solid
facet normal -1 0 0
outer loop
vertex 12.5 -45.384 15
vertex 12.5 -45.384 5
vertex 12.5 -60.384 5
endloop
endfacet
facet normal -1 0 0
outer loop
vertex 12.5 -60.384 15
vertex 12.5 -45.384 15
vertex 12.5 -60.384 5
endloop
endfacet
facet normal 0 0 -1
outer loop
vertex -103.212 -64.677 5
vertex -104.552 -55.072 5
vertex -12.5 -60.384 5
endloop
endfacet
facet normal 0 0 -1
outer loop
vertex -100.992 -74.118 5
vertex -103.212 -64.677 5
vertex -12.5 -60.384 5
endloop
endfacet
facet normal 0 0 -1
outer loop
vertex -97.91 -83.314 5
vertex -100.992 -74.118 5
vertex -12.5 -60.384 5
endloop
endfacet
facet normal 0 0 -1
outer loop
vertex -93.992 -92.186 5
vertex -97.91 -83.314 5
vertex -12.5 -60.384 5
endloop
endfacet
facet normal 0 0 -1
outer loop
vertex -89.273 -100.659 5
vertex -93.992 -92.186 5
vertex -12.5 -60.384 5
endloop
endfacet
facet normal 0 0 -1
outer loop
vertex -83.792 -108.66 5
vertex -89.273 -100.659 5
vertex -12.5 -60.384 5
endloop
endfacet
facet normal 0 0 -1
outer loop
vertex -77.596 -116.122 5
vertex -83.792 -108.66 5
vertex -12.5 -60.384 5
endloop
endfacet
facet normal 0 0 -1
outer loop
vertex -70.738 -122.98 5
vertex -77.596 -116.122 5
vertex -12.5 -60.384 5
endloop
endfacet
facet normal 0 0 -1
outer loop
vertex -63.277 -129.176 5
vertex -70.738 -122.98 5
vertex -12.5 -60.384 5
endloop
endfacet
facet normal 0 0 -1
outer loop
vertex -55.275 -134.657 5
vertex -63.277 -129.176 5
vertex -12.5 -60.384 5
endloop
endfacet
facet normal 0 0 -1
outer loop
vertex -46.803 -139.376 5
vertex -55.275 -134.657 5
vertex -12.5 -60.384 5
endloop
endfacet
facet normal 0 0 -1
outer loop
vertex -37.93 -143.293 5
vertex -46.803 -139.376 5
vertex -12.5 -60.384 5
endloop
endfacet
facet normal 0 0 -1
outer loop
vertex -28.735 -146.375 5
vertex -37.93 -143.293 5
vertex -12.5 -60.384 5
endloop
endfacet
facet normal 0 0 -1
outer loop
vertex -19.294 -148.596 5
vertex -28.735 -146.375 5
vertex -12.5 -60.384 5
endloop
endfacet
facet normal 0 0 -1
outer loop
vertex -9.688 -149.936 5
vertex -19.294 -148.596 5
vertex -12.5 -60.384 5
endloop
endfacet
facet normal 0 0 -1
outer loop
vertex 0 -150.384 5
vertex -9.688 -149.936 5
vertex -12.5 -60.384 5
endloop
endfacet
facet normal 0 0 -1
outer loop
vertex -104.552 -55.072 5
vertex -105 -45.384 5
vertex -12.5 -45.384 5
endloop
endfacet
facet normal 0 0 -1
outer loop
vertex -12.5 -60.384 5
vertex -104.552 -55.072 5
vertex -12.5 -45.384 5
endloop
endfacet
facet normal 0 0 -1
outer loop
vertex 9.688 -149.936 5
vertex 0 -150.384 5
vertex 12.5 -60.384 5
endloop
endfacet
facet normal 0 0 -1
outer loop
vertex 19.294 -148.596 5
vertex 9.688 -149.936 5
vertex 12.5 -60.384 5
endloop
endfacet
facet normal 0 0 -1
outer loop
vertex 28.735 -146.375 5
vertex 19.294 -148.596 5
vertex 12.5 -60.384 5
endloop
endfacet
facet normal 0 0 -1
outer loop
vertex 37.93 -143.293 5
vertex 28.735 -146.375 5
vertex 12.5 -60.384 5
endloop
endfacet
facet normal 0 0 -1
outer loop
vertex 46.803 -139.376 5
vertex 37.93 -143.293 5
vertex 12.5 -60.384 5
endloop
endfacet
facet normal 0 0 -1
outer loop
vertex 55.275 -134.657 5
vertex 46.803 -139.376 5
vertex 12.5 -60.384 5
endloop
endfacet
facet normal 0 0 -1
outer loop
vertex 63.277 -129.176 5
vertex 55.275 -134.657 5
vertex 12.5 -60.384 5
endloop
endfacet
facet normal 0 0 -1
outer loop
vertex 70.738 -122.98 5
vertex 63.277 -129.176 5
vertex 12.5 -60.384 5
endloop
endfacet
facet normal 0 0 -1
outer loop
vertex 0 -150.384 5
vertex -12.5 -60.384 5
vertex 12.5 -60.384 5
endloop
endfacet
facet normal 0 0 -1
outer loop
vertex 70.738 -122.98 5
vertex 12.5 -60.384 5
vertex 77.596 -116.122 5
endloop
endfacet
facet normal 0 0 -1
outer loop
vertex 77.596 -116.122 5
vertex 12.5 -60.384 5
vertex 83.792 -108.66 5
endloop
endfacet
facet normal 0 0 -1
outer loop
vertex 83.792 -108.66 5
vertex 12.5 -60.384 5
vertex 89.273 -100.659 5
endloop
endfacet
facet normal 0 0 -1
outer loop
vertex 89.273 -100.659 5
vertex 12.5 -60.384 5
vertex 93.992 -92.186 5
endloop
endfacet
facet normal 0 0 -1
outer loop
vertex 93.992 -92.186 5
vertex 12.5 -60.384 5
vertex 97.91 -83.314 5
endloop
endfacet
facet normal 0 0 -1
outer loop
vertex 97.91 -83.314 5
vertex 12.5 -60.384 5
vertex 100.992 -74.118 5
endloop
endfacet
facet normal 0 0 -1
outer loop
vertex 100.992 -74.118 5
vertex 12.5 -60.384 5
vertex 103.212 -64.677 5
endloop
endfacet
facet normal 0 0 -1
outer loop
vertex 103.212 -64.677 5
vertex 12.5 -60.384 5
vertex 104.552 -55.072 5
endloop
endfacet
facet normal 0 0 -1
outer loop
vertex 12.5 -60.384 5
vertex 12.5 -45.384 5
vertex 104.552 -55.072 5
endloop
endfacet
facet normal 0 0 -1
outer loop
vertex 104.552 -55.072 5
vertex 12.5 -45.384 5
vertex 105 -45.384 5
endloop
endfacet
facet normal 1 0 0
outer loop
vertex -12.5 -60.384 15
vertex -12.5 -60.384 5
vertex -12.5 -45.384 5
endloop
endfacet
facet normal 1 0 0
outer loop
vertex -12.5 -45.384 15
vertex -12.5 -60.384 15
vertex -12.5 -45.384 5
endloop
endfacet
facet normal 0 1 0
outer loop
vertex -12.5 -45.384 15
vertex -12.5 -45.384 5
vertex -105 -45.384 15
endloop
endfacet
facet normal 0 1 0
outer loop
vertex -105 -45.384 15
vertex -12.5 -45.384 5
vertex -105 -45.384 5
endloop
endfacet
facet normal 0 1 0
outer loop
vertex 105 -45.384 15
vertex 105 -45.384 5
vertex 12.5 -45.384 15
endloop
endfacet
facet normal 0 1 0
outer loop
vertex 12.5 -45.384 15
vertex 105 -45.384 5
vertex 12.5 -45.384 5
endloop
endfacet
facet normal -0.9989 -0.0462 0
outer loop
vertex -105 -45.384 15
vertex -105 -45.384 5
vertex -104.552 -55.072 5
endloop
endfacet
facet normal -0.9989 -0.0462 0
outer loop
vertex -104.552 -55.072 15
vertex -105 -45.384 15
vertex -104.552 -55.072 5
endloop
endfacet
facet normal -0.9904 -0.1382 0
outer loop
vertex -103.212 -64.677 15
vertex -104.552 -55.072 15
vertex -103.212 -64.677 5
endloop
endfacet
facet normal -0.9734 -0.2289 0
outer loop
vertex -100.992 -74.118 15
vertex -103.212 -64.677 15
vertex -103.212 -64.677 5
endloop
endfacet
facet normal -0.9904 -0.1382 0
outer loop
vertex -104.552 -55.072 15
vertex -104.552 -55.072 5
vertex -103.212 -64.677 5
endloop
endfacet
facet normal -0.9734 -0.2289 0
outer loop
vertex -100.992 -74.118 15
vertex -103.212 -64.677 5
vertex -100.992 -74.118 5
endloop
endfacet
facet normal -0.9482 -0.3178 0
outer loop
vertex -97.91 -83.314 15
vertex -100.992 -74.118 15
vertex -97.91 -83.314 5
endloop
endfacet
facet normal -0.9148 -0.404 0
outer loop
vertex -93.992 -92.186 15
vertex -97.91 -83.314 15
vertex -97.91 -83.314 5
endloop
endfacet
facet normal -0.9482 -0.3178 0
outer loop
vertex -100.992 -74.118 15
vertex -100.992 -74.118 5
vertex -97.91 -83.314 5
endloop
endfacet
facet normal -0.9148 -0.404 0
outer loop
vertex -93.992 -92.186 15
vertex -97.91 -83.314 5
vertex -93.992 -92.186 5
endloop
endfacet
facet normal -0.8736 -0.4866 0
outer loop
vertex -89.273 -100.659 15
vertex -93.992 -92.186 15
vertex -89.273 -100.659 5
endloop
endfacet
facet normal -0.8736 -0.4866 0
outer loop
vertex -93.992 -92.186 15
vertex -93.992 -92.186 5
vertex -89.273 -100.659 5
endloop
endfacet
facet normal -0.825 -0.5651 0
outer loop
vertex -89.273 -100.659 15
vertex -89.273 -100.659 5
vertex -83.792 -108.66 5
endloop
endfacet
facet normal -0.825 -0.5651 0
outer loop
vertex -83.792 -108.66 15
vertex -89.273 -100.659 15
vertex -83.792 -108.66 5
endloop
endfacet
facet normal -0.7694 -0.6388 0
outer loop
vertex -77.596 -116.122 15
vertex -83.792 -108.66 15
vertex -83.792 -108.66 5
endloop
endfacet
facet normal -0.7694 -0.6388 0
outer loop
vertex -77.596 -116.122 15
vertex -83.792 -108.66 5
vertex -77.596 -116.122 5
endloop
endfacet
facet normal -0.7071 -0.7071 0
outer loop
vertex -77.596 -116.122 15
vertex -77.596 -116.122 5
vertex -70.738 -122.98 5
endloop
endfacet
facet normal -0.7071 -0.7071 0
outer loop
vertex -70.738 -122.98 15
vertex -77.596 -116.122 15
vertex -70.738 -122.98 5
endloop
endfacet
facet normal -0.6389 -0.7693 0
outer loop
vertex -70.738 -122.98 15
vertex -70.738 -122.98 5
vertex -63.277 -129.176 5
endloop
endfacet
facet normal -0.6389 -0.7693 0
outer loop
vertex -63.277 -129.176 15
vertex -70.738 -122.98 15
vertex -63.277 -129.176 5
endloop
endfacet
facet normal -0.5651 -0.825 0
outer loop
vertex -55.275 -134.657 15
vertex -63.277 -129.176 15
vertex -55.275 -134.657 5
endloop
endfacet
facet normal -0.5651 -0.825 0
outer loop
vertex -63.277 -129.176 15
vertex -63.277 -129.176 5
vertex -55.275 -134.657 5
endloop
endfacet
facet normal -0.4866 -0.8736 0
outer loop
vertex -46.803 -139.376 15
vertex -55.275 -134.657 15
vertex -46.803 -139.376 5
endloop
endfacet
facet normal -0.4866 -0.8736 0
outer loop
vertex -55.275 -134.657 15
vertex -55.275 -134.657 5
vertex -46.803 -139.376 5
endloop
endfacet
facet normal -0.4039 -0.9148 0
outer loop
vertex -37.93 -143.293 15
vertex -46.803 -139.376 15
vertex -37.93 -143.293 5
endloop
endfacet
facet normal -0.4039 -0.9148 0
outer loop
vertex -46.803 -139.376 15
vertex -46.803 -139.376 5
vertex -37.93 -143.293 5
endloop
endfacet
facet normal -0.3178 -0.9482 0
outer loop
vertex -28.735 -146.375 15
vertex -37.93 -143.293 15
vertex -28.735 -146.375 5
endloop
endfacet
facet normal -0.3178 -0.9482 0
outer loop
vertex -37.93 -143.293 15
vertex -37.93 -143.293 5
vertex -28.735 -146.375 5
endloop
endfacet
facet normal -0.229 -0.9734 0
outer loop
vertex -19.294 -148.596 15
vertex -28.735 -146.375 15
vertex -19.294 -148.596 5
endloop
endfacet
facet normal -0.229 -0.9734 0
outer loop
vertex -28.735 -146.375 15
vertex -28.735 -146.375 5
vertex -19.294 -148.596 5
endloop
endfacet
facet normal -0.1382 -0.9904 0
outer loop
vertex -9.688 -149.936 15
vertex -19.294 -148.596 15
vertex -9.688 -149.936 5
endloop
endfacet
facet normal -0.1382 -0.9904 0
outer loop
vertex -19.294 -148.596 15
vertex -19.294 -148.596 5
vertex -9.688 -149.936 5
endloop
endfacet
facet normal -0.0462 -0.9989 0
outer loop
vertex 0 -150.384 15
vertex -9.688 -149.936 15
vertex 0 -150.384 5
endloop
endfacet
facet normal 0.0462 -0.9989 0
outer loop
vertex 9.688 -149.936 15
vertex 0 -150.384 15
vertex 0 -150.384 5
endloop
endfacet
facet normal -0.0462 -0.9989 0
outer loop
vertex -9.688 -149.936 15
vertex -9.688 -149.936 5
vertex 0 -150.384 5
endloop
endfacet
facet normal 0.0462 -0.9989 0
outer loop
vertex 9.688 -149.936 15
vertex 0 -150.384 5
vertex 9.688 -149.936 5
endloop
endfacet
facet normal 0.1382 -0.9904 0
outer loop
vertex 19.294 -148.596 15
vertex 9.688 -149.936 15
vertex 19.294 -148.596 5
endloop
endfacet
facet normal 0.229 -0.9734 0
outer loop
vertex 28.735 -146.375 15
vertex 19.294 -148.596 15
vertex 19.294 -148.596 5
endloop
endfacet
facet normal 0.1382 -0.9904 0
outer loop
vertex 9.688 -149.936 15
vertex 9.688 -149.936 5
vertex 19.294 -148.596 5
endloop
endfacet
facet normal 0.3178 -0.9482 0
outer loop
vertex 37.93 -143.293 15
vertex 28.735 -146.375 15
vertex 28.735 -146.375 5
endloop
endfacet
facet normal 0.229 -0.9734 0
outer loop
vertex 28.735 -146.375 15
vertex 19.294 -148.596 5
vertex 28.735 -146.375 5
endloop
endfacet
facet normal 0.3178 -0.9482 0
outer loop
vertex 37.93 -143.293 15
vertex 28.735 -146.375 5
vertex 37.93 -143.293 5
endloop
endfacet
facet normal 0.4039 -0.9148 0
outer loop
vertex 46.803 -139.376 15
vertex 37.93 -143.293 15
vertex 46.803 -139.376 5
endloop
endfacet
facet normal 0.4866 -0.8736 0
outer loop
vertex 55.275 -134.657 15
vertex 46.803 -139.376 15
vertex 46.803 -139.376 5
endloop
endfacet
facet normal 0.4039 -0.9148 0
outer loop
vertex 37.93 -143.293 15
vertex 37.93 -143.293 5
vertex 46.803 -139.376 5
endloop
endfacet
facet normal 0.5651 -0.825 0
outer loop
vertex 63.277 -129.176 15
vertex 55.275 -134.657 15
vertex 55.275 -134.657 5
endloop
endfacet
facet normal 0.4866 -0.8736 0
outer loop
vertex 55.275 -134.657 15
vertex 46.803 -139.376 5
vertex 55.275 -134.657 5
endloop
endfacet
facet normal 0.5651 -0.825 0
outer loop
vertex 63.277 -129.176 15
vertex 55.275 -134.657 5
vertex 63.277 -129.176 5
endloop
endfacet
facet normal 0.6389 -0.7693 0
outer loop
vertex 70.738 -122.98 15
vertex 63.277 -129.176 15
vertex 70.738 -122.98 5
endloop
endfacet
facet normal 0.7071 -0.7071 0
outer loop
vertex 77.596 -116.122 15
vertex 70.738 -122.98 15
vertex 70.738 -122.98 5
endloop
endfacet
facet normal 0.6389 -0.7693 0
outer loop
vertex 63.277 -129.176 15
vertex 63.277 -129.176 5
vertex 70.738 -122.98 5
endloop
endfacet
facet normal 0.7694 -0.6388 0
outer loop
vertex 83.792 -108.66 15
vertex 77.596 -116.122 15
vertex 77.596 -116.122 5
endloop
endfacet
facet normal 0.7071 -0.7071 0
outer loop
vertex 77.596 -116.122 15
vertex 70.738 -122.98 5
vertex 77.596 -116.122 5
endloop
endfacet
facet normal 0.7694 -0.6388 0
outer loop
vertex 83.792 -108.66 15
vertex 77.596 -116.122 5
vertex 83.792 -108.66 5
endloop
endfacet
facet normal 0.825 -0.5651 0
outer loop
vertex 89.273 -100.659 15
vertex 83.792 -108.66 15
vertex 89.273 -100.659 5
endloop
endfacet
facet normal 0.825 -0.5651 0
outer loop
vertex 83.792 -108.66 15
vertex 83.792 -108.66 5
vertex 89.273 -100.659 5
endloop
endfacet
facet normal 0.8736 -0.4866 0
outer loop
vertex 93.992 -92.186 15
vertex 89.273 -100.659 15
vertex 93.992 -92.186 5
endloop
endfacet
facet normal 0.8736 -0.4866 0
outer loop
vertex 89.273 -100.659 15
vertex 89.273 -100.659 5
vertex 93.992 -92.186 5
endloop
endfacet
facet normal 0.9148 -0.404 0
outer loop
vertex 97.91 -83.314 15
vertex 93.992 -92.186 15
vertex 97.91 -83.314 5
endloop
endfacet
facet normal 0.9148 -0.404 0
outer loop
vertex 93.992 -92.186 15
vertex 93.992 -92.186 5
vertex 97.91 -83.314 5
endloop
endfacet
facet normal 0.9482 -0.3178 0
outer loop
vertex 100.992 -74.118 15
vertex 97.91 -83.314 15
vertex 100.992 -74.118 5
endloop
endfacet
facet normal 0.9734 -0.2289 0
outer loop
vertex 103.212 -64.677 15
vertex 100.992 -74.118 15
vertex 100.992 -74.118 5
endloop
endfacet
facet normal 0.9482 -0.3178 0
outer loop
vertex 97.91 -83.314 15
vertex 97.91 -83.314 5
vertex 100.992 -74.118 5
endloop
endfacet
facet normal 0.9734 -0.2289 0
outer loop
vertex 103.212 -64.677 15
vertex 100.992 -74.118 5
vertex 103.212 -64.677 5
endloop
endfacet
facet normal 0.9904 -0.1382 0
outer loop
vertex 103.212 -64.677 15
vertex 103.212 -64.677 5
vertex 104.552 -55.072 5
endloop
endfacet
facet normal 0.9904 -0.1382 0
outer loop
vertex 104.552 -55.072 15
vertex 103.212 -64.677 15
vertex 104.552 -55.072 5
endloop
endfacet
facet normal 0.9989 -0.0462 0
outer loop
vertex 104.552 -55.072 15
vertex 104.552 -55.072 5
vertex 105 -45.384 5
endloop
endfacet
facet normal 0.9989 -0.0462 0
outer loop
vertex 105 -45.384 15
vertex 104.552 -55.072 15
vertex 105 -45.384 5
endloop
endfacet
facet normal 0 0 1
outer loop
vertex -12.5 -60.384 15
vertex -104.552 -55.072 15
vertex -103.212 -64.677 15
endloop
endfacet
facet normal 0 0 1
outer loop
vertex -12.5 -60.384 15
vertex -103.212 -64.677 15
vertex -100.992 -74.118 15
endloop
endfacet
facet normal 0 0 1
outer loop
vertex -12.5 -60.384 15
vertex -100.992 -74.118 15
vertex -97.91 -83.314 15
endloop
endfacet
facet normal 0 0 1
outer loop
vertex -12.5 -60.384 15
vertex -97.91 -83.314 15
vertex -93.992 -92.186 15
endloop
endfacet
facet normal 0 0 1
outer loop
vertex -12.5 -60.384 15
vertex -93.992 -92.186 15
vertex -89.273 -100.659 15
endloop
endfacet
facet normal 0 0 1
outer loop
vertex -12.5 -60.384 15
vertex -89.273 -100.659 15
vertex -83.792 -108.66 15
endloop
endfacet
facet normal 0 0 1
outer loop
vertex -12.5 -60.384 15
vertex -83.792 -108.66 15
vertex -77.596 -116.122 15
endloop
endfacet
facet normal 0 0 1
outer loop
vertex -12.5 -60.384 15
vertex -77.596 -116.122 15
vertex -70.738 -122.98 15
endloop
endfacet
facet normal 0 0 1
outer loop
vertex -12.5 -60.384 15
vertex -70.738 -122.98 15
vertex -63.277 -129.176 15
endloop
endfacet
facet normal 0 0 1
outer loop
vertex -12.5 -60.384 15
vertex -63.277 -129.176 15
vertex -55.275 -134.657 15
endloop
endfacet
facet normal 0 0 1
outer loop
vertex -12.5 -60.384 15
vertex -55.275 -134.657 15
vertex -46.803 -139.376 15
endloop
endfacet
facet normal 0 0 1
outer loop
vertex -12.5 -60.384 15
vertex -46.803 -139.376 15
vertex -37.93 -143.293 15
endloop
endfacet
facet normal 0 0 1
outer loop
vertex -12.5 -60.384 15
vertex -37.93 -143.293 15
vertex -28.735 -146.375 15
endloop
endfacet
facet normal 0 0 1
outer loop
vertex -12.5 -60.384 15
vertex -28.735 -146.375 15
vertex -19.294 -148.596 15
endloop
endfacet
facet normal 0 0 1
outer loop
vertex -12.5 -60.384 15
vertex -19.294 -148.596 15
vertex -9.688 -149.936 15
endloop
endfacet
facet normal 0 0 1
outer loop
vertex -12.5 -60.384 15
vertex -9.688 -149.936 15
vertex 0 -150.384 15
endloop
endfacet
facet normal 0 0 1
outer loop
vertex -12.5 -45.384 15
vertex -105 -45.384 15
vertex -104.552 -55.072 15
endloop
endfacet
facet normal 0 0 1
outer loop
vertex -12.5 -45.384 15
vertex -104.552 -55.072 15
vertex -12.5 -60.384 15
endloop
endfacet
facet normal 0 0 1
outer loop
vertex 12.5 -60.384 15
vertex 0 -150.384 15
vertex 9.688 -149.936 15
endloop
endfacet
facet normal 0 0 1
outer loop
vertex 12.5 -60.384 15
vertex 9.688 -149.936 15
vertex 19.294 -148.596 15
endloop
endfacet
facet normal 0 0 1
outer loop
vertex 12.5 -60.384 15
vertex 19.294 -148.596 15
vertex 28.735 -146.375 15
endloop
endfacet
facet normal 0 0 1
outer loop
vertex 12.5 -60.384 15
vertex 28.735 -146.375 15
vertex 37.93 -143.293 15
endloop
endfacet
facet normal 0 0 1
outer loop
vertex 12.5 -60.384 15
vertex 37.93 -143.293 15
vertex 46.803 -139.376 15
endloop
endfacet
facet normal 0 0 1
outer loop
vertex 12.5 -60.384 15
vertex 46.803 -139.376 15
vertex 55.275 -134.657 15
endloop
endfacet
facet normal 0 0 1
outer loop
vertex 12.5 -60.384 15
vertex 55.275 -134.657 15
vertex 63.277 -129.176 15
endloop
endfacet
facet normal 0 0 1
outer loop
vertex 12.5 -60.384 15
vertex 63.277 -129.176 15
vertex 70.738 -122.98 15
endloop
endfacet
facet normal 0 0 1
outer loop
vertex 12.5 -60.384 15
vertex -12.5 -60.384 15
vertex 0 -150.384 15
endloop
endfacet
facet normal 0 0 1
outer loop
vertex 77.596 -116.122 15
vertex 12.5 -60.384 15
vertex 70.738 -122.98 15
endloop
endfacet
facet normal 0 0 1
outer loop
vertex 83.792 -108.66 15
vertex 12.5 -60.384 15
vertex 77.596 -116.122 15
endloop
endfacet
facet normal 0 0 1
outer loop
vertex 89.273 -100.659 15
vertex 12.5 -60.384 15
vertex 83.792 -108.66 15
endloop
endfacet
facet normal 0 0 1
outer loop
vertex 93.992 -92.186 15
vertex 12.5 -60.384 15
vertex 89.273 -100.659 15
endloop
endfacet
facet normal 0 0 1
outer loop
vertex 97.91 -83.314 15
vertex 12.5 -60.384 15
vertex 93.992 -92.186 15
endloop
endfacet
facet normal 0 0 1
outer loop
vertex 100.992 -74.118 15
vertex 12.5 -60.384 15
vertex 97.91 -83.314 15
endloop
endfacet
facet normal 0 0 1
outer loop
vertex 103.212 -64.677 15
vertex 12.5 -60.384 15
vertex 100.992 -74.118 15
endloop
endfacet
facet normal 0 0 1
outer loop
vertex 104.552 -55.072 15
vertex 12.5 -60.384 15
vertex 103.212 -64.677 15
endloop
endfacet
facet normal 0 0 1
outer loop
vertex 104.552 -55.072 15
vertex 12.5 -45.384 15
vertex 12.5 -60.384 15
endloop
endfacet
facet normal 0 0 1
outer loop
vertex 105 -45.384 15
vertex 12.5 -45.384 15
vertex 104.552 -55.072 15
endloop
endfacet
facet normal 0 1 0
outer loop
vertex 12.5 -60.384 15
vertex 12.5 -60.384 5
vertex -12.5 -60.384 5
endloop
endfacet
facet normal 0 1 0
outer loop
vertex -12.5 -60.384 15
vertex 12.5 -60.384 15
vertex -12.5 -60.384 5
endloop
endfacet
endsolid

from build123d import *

# Parameters (mm, degrees)
EXTRUDE_2_DEPTH = 20
SCALE_1_SCALE   = 0.5


with BuildPart() as part:
    # 草图1 → 凸台-拉伸2 (new body)
    with BuildSketch(Plane.XY):
        with BuildLine():
            Line((-25, -30), (-25, 0))
            Line((-25, 0), (-210, 0))
            ThreePointArc((-210, 0), (0, -210), (210, 0))
            Line((210, 0), (25, 0))
            Line((25, 0), (25, -30))
            Line((25, -30), (0, -30))
            Line((0, -30), (-25, -30))
        make_face()
    extrude(amount=EXTRUDE_2_DEPTH)


with BuildPart() as part_1:
    # 缩放比例1: scaled about (0, -90.767415576, 10)
    add(part.part.scale(SCALE_1_SCALE).moved(Location((0, -45.383707788, 5))))


solid = part_1.part
